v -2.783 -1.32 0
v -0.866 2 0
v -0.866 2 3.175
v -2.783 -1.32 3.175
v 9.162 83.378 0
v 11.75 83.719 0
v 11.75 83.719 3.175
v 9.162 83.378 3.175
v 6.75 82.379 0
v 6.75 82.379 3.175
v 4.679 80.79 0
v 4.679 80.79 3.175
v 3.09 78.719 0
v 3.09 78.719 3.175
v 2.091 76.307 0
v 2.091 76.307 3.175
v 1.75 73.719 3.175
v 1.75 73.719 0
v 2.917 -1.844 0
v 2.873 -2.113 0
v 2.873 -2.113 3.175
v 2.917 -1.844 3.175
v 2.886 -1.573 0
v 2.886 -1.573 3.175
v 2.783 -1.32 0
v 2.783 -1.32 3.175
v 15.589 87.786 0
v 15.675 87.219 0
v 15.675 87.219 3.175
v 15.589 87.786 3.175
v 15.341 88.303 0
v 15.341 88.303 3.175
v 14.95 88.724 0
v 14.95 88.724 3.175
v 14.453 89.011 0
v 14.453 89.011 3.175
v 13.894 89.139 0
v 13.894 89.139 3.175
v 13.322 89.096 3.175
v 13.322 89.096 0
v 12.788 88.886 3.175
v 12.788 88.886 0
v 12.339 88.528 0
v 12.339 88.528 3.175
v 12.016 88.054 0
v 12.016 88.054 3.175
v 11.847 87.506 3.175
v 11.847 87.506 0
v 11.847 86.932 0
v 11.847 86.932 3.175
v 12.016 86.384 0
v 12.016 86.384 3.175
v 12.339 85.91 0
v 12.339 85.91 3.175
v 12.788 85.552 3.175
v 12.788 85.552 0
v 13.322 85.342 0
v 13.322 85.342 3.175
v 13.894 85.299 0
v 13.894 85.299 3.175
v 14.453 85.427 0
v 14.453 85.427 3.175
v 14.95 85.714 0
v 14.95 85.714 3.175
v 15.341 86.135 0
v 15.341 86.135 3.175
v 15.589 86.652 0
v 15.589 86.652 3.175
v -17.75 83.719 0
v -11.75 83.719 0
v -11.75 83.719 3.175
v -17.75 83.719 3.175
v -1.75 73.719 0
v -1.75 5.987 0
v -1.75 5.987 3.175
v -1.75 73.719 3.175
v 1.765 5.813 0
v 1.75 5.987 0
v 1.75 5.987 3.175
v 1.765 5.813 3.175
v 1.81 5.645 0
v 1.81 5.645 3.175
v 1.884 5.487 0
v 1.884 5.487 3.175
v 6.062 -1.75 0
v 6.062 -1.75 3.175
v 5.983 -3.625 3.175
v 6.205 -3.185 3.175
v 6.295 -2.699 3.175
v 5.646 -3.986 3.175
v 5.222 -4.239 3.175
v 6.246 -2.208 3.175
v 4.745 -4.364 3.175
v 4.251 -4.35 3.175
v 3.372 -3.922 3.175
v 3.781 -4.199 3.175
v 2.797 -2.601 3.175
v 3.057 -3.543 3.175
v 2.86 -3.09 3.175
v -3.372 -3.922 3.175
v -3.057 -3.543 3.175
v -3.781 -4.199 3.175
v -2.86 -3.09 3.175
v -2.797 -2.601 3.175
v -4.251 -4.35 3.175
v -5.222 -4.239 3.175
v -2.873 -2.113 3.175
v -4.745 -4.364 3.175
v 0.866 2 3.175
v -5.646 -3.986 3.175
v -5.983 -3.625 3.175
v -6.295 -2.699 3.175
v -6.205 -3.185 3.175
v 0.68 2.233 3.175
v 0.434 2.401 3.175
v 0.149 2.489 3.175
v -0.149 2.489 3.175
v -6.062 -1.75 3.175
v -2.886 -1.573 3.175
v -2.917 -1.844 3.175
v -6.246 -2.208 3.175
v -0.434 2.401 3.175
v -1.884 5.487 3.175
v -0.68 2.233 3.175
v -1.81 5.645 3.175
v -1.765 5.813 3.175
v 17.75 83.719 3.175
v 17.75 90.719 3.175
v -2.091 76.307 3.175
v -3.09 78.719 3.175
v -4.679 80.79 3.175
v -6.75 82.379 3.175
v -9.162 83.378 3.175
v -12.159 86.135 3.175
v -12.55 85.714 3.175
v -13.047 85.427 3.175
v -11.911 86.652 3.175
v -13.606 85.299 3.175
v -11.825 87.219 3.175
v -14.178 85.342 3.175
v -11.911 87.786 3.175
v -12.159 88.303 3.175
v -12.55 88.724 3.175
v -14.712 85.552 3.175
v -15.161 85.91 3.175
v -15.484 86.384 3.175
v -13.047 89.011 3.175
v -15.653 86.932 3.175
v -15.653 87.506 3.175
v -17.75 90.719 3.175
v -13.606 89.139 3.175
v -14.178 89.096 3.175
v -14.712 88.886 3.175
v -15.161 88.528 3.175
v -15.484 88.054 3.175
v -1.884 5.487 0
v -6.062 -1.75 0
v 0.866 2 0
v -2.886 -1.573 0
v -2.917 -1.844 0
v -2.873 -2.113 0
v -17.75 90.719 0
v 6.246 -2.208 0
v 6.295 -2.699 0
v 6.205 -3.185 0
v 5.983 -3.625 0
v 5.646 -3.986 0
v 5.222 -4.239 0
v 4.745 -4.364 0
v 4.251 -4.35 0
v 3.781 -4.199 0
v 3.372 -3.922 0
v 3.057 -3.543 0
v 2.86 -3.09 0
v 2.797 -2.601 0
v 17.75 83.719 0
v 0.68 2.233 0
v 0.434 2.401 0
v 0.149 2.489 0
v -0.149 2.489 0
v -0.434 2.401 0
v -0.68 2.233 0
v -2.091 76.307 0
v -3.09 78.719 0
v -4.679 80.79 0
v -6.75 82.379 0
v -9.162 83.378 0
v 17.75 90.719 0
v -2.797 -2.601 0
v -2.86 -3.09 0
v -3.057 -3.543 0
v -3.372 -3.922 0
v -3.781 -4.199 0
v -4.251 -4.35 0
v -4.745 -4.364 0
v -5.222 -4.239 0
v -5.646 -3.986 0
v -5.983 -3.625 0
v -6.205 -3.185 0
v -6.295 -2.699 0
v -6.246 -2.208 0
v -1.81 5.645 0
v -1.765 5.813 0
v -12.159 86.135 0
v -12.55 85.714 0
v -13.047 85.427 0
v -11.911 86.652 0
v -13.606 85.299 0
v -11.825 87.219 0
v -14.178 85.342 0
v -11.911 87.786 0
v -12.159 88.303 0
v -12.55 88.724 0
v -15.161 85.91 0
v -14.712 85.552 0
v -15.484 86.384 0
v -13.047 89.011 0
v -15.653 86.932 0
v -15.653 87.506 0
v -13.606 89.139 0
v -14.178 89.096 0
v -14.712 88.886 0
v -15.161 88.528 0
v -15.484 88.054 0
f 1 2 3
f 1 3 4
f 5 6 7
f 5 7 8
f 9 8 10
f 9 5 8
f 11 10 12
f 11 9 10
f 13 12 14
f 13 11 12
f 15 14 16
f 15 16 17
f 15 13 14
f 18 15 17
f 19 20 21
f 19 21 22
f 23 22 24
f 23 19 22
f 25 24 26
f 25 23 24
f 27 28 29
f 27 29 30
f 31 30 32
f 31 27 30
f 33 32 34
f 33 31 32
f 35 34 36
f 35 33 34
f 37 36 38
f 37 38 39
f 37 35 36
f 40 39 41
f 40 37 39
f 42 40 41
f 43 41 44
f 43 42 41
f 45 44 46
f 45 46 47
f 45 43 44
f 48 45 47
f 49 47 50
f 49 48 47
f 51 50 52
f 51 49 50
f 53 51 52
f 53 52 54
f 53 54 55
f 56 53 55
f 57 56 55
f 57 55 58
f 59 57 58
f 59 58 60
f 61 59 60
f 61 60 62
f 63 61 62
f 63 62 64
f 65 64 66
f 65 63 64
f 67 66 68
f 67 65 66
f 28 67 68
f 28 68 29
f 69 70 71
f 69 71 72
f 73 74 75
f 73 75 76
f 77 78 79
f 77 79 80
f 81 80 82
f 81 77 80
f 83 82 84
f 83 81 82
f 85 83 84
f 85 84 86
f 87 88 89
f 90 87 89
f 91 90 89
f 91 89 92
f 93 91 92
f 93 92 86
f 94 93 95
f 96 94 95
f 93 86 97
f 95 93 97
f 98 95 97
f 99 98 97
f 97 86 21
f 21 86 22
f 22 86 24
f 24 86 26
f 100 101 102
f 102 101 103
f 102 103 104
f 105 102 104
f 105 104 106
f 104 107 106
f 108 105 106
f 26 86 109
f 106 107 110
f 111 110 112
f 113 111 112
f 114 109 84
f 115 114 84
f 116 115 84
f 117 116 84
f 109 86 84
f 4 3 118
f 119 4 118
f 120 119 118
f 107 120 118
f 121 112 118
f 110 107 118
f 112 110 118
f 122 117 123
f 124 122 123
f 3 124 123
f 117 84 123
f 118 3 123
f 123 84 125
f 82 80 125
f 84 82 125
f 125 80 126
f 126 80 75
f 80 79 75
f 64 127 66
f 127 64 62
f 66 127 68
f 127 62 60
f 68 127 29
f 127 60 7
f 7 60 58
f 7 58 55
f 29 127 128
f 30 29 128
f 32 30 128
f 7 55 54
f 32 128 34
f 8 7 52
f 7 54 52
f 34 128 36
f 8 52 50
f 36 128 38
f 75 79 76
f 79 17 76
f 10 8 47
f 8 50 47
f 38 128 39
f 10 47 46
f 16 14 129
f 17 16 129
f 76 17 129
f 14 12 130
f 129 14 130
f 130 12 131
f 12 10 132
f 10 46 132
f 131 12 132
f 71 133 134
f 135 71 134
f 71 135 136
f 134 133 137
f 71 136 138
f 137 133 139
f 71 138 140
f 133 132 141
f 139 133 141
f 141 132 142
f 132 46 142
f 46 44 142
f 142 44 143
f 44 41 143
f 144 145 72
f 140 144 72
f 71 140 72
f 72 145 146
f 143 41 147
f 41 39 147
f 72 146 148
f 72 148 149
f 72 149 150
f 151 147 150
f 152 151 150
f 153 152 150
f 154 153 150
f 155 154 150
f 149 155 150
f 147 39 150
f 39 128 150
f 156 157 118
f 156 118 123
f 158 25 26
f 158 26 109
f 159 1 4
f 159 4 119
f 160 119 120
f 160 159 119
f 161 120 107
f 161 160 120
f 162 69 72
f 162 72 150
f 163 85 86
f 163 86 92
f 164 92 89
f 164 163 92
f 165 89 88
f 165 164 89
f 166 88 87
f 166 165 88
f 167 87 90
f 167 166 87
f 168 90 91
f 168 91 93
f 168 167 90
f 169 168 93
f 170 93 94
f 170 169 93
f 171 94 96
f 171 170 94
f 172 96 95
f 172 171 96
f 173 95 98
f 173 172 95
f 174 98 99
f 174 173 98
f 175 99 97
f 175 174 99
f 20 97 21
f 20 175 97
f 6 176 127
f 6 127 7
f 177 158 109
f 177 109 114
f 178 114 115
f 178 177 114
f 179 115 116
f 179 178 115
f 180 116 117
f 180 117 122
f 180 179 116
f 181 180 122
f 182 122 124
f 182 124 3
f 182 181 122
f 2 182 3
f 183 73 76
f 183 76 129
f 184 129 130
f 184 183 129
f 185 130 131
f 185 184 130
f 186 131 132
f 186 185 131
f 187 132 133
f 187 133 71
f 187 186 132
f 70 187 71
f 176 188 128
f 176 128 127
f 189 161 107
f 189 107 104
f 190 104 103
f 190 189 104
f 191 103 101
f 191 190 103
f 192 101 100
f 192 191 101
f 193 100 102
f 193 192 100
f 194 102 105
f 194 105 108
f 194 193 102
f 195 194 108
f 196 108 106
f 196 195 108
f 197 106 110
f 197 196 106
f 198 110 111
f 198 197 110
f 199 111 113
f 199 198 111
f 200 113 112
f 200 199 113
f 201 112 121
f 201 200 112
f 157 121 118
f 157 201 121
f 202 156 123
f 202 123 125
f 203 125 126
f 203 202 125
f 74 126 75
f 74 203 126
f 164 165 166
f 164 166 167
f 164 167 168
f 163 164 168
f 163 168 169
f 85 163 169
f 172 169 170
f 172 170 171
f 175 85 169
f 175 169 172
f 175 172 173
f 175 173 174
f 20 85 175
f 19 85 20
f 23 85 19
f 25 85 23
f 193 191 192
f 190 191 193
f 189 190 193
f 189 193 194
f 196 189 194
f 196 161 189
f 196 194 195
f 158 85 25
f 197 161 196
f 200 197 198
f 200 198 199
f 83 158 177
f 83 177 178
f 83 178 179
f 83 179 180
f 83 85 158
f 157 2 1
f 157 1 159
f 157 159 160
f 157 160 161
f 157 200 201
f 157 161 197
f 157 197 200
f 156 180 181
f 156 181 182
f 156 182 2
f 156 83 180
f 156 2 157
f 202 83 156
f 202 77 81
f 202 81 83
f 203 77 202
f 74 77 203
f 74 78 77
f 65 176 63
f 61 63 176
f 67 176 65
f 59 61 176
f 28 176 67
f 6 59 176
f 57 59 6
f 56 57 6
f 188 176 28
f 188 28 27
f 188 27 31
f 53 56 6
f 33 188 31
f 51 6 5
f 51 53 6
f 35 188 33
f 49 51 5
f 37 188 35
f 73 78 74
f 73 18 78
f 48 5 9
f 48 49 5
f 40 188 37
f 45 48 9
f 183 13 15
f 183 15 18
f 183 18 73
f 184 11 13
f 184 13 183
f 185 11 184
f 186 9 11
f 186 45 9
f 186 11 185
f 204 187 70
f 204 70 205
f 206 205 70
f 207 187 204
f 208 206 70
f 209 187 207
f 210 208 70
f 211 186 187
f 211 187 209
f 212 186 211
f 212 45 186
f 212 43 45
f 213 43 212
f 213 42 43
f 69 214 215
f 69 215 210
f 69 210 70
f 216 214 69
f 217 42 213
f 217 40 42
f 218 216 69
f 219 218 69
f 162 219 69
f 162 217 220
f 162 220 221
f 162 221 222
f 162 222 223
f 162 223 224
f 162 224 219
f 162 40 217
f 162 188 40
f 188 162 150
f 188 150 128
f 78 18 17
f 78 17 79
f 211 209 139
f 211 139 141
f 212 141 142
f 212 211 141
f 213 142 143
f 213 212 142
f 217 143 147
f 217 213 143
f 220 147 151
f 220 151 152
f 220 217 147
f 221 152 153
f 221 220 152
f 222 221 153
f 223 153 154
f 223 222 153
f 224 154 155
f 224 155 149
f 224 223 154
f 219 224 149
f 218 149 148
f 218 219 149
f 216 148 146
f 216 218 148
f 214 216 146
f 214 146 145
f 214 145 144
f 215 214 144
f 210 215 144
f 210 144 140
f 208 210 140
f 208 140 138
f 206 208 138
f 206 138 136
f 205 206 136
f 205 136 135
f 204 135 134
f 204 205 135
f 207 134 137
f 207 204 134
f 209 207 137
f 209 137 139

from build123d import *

# Parameters (mm, degrees)
SKETCH1_R           = 1.925
BOSS_EXTRUDE1_DEPTH = 3.175


with BuildPart() as part:
    # Sketch1 → Boss-Extrude1 (new body)
    with BuildSketch(Plane.XY):
        with BuildLine():
            Line((1.75, 90.718911087), (17.75, 90.718911087))
            Line((17.75, 90.718911087), (17.75, 83.718911087))
            Line((17.75, 83.718911087), (11.75, 83.718911087))
            ThreePointArc((11.75, 83.718911087), (4.678932188, 80.789978899), (1.75, 73.718911087))
            Line((1.75, 73.718911087), (1.75, 5.986860279))
            ThreePointArc((1.75, 5.986860279), (1.784074174, 5.728041234), (1.883974596, 5.486860279))
            Line((1.883974596, 5.486860279), (6.062177826, -1.75))
            ThreePointArc((6.062177826, -1.75), (4.744524835, -4.363775134), (2.873226135, -2.112937283))
            ThreePointArc((2.873226135, -2.112937283), (2.91057922, -1.707249179), (2.783018833, -1.320330017))
            Line((2.783018833, -1.320330017), (0.866025404, 2))
            ThreePointArc((0.866025404, 2), (0, 2.5), (-0.866025404, 2))
            Line((-0.866025404, 2), (-2.783018833, -1.320330017))
            ThreePointArc((-2.783018833, -1.320330017), (-2.91057922, -1.707249179), (-2.873226135, -2.112937283))
            ThreePointArc((-2.873226135, -2.112937283), (-4.744524835, -4.363775134), (-6.062177826, -1.75))
            Line((-6.062177826, -1.75), (-1.883974596, 5.486860279))
            ThreePointArc((-1.883974596, 5.486860279), (-1.784074174, 5.728041234), (-1.75, 5.986860279))
            Line((-1.75, 5.986860279), (-1.75, 73.718911087))
            ThreePointArc((-1.75, 73.718911087), (-4.678932188, 80.789978899), (-11.75, 83.718911087))
            Line((-11.75, 83.718911087), (-17.75, 83.718911087))
            Line((-17.75, 83.718911087), (-17.75, 90.718911087))
            Line((-17.75, 90.718911087), (-1.75, 90.718911087))
            Line((-1.75, 90.718911087), (1.75, 90.718911087))
        make_face()
        with Locations((-13.75, 87.218911087)):
            Circle(SKETCH1_R, mode=Mode.SUBTRACT)
        with Locations((13.75, 87.218911087)):
            Circle(SKETCH1_R, mode=Mode.SUBTRACT)
    extrude(amount=BOSS_EXTRUDE1_DEPTH)


solid = part.part
